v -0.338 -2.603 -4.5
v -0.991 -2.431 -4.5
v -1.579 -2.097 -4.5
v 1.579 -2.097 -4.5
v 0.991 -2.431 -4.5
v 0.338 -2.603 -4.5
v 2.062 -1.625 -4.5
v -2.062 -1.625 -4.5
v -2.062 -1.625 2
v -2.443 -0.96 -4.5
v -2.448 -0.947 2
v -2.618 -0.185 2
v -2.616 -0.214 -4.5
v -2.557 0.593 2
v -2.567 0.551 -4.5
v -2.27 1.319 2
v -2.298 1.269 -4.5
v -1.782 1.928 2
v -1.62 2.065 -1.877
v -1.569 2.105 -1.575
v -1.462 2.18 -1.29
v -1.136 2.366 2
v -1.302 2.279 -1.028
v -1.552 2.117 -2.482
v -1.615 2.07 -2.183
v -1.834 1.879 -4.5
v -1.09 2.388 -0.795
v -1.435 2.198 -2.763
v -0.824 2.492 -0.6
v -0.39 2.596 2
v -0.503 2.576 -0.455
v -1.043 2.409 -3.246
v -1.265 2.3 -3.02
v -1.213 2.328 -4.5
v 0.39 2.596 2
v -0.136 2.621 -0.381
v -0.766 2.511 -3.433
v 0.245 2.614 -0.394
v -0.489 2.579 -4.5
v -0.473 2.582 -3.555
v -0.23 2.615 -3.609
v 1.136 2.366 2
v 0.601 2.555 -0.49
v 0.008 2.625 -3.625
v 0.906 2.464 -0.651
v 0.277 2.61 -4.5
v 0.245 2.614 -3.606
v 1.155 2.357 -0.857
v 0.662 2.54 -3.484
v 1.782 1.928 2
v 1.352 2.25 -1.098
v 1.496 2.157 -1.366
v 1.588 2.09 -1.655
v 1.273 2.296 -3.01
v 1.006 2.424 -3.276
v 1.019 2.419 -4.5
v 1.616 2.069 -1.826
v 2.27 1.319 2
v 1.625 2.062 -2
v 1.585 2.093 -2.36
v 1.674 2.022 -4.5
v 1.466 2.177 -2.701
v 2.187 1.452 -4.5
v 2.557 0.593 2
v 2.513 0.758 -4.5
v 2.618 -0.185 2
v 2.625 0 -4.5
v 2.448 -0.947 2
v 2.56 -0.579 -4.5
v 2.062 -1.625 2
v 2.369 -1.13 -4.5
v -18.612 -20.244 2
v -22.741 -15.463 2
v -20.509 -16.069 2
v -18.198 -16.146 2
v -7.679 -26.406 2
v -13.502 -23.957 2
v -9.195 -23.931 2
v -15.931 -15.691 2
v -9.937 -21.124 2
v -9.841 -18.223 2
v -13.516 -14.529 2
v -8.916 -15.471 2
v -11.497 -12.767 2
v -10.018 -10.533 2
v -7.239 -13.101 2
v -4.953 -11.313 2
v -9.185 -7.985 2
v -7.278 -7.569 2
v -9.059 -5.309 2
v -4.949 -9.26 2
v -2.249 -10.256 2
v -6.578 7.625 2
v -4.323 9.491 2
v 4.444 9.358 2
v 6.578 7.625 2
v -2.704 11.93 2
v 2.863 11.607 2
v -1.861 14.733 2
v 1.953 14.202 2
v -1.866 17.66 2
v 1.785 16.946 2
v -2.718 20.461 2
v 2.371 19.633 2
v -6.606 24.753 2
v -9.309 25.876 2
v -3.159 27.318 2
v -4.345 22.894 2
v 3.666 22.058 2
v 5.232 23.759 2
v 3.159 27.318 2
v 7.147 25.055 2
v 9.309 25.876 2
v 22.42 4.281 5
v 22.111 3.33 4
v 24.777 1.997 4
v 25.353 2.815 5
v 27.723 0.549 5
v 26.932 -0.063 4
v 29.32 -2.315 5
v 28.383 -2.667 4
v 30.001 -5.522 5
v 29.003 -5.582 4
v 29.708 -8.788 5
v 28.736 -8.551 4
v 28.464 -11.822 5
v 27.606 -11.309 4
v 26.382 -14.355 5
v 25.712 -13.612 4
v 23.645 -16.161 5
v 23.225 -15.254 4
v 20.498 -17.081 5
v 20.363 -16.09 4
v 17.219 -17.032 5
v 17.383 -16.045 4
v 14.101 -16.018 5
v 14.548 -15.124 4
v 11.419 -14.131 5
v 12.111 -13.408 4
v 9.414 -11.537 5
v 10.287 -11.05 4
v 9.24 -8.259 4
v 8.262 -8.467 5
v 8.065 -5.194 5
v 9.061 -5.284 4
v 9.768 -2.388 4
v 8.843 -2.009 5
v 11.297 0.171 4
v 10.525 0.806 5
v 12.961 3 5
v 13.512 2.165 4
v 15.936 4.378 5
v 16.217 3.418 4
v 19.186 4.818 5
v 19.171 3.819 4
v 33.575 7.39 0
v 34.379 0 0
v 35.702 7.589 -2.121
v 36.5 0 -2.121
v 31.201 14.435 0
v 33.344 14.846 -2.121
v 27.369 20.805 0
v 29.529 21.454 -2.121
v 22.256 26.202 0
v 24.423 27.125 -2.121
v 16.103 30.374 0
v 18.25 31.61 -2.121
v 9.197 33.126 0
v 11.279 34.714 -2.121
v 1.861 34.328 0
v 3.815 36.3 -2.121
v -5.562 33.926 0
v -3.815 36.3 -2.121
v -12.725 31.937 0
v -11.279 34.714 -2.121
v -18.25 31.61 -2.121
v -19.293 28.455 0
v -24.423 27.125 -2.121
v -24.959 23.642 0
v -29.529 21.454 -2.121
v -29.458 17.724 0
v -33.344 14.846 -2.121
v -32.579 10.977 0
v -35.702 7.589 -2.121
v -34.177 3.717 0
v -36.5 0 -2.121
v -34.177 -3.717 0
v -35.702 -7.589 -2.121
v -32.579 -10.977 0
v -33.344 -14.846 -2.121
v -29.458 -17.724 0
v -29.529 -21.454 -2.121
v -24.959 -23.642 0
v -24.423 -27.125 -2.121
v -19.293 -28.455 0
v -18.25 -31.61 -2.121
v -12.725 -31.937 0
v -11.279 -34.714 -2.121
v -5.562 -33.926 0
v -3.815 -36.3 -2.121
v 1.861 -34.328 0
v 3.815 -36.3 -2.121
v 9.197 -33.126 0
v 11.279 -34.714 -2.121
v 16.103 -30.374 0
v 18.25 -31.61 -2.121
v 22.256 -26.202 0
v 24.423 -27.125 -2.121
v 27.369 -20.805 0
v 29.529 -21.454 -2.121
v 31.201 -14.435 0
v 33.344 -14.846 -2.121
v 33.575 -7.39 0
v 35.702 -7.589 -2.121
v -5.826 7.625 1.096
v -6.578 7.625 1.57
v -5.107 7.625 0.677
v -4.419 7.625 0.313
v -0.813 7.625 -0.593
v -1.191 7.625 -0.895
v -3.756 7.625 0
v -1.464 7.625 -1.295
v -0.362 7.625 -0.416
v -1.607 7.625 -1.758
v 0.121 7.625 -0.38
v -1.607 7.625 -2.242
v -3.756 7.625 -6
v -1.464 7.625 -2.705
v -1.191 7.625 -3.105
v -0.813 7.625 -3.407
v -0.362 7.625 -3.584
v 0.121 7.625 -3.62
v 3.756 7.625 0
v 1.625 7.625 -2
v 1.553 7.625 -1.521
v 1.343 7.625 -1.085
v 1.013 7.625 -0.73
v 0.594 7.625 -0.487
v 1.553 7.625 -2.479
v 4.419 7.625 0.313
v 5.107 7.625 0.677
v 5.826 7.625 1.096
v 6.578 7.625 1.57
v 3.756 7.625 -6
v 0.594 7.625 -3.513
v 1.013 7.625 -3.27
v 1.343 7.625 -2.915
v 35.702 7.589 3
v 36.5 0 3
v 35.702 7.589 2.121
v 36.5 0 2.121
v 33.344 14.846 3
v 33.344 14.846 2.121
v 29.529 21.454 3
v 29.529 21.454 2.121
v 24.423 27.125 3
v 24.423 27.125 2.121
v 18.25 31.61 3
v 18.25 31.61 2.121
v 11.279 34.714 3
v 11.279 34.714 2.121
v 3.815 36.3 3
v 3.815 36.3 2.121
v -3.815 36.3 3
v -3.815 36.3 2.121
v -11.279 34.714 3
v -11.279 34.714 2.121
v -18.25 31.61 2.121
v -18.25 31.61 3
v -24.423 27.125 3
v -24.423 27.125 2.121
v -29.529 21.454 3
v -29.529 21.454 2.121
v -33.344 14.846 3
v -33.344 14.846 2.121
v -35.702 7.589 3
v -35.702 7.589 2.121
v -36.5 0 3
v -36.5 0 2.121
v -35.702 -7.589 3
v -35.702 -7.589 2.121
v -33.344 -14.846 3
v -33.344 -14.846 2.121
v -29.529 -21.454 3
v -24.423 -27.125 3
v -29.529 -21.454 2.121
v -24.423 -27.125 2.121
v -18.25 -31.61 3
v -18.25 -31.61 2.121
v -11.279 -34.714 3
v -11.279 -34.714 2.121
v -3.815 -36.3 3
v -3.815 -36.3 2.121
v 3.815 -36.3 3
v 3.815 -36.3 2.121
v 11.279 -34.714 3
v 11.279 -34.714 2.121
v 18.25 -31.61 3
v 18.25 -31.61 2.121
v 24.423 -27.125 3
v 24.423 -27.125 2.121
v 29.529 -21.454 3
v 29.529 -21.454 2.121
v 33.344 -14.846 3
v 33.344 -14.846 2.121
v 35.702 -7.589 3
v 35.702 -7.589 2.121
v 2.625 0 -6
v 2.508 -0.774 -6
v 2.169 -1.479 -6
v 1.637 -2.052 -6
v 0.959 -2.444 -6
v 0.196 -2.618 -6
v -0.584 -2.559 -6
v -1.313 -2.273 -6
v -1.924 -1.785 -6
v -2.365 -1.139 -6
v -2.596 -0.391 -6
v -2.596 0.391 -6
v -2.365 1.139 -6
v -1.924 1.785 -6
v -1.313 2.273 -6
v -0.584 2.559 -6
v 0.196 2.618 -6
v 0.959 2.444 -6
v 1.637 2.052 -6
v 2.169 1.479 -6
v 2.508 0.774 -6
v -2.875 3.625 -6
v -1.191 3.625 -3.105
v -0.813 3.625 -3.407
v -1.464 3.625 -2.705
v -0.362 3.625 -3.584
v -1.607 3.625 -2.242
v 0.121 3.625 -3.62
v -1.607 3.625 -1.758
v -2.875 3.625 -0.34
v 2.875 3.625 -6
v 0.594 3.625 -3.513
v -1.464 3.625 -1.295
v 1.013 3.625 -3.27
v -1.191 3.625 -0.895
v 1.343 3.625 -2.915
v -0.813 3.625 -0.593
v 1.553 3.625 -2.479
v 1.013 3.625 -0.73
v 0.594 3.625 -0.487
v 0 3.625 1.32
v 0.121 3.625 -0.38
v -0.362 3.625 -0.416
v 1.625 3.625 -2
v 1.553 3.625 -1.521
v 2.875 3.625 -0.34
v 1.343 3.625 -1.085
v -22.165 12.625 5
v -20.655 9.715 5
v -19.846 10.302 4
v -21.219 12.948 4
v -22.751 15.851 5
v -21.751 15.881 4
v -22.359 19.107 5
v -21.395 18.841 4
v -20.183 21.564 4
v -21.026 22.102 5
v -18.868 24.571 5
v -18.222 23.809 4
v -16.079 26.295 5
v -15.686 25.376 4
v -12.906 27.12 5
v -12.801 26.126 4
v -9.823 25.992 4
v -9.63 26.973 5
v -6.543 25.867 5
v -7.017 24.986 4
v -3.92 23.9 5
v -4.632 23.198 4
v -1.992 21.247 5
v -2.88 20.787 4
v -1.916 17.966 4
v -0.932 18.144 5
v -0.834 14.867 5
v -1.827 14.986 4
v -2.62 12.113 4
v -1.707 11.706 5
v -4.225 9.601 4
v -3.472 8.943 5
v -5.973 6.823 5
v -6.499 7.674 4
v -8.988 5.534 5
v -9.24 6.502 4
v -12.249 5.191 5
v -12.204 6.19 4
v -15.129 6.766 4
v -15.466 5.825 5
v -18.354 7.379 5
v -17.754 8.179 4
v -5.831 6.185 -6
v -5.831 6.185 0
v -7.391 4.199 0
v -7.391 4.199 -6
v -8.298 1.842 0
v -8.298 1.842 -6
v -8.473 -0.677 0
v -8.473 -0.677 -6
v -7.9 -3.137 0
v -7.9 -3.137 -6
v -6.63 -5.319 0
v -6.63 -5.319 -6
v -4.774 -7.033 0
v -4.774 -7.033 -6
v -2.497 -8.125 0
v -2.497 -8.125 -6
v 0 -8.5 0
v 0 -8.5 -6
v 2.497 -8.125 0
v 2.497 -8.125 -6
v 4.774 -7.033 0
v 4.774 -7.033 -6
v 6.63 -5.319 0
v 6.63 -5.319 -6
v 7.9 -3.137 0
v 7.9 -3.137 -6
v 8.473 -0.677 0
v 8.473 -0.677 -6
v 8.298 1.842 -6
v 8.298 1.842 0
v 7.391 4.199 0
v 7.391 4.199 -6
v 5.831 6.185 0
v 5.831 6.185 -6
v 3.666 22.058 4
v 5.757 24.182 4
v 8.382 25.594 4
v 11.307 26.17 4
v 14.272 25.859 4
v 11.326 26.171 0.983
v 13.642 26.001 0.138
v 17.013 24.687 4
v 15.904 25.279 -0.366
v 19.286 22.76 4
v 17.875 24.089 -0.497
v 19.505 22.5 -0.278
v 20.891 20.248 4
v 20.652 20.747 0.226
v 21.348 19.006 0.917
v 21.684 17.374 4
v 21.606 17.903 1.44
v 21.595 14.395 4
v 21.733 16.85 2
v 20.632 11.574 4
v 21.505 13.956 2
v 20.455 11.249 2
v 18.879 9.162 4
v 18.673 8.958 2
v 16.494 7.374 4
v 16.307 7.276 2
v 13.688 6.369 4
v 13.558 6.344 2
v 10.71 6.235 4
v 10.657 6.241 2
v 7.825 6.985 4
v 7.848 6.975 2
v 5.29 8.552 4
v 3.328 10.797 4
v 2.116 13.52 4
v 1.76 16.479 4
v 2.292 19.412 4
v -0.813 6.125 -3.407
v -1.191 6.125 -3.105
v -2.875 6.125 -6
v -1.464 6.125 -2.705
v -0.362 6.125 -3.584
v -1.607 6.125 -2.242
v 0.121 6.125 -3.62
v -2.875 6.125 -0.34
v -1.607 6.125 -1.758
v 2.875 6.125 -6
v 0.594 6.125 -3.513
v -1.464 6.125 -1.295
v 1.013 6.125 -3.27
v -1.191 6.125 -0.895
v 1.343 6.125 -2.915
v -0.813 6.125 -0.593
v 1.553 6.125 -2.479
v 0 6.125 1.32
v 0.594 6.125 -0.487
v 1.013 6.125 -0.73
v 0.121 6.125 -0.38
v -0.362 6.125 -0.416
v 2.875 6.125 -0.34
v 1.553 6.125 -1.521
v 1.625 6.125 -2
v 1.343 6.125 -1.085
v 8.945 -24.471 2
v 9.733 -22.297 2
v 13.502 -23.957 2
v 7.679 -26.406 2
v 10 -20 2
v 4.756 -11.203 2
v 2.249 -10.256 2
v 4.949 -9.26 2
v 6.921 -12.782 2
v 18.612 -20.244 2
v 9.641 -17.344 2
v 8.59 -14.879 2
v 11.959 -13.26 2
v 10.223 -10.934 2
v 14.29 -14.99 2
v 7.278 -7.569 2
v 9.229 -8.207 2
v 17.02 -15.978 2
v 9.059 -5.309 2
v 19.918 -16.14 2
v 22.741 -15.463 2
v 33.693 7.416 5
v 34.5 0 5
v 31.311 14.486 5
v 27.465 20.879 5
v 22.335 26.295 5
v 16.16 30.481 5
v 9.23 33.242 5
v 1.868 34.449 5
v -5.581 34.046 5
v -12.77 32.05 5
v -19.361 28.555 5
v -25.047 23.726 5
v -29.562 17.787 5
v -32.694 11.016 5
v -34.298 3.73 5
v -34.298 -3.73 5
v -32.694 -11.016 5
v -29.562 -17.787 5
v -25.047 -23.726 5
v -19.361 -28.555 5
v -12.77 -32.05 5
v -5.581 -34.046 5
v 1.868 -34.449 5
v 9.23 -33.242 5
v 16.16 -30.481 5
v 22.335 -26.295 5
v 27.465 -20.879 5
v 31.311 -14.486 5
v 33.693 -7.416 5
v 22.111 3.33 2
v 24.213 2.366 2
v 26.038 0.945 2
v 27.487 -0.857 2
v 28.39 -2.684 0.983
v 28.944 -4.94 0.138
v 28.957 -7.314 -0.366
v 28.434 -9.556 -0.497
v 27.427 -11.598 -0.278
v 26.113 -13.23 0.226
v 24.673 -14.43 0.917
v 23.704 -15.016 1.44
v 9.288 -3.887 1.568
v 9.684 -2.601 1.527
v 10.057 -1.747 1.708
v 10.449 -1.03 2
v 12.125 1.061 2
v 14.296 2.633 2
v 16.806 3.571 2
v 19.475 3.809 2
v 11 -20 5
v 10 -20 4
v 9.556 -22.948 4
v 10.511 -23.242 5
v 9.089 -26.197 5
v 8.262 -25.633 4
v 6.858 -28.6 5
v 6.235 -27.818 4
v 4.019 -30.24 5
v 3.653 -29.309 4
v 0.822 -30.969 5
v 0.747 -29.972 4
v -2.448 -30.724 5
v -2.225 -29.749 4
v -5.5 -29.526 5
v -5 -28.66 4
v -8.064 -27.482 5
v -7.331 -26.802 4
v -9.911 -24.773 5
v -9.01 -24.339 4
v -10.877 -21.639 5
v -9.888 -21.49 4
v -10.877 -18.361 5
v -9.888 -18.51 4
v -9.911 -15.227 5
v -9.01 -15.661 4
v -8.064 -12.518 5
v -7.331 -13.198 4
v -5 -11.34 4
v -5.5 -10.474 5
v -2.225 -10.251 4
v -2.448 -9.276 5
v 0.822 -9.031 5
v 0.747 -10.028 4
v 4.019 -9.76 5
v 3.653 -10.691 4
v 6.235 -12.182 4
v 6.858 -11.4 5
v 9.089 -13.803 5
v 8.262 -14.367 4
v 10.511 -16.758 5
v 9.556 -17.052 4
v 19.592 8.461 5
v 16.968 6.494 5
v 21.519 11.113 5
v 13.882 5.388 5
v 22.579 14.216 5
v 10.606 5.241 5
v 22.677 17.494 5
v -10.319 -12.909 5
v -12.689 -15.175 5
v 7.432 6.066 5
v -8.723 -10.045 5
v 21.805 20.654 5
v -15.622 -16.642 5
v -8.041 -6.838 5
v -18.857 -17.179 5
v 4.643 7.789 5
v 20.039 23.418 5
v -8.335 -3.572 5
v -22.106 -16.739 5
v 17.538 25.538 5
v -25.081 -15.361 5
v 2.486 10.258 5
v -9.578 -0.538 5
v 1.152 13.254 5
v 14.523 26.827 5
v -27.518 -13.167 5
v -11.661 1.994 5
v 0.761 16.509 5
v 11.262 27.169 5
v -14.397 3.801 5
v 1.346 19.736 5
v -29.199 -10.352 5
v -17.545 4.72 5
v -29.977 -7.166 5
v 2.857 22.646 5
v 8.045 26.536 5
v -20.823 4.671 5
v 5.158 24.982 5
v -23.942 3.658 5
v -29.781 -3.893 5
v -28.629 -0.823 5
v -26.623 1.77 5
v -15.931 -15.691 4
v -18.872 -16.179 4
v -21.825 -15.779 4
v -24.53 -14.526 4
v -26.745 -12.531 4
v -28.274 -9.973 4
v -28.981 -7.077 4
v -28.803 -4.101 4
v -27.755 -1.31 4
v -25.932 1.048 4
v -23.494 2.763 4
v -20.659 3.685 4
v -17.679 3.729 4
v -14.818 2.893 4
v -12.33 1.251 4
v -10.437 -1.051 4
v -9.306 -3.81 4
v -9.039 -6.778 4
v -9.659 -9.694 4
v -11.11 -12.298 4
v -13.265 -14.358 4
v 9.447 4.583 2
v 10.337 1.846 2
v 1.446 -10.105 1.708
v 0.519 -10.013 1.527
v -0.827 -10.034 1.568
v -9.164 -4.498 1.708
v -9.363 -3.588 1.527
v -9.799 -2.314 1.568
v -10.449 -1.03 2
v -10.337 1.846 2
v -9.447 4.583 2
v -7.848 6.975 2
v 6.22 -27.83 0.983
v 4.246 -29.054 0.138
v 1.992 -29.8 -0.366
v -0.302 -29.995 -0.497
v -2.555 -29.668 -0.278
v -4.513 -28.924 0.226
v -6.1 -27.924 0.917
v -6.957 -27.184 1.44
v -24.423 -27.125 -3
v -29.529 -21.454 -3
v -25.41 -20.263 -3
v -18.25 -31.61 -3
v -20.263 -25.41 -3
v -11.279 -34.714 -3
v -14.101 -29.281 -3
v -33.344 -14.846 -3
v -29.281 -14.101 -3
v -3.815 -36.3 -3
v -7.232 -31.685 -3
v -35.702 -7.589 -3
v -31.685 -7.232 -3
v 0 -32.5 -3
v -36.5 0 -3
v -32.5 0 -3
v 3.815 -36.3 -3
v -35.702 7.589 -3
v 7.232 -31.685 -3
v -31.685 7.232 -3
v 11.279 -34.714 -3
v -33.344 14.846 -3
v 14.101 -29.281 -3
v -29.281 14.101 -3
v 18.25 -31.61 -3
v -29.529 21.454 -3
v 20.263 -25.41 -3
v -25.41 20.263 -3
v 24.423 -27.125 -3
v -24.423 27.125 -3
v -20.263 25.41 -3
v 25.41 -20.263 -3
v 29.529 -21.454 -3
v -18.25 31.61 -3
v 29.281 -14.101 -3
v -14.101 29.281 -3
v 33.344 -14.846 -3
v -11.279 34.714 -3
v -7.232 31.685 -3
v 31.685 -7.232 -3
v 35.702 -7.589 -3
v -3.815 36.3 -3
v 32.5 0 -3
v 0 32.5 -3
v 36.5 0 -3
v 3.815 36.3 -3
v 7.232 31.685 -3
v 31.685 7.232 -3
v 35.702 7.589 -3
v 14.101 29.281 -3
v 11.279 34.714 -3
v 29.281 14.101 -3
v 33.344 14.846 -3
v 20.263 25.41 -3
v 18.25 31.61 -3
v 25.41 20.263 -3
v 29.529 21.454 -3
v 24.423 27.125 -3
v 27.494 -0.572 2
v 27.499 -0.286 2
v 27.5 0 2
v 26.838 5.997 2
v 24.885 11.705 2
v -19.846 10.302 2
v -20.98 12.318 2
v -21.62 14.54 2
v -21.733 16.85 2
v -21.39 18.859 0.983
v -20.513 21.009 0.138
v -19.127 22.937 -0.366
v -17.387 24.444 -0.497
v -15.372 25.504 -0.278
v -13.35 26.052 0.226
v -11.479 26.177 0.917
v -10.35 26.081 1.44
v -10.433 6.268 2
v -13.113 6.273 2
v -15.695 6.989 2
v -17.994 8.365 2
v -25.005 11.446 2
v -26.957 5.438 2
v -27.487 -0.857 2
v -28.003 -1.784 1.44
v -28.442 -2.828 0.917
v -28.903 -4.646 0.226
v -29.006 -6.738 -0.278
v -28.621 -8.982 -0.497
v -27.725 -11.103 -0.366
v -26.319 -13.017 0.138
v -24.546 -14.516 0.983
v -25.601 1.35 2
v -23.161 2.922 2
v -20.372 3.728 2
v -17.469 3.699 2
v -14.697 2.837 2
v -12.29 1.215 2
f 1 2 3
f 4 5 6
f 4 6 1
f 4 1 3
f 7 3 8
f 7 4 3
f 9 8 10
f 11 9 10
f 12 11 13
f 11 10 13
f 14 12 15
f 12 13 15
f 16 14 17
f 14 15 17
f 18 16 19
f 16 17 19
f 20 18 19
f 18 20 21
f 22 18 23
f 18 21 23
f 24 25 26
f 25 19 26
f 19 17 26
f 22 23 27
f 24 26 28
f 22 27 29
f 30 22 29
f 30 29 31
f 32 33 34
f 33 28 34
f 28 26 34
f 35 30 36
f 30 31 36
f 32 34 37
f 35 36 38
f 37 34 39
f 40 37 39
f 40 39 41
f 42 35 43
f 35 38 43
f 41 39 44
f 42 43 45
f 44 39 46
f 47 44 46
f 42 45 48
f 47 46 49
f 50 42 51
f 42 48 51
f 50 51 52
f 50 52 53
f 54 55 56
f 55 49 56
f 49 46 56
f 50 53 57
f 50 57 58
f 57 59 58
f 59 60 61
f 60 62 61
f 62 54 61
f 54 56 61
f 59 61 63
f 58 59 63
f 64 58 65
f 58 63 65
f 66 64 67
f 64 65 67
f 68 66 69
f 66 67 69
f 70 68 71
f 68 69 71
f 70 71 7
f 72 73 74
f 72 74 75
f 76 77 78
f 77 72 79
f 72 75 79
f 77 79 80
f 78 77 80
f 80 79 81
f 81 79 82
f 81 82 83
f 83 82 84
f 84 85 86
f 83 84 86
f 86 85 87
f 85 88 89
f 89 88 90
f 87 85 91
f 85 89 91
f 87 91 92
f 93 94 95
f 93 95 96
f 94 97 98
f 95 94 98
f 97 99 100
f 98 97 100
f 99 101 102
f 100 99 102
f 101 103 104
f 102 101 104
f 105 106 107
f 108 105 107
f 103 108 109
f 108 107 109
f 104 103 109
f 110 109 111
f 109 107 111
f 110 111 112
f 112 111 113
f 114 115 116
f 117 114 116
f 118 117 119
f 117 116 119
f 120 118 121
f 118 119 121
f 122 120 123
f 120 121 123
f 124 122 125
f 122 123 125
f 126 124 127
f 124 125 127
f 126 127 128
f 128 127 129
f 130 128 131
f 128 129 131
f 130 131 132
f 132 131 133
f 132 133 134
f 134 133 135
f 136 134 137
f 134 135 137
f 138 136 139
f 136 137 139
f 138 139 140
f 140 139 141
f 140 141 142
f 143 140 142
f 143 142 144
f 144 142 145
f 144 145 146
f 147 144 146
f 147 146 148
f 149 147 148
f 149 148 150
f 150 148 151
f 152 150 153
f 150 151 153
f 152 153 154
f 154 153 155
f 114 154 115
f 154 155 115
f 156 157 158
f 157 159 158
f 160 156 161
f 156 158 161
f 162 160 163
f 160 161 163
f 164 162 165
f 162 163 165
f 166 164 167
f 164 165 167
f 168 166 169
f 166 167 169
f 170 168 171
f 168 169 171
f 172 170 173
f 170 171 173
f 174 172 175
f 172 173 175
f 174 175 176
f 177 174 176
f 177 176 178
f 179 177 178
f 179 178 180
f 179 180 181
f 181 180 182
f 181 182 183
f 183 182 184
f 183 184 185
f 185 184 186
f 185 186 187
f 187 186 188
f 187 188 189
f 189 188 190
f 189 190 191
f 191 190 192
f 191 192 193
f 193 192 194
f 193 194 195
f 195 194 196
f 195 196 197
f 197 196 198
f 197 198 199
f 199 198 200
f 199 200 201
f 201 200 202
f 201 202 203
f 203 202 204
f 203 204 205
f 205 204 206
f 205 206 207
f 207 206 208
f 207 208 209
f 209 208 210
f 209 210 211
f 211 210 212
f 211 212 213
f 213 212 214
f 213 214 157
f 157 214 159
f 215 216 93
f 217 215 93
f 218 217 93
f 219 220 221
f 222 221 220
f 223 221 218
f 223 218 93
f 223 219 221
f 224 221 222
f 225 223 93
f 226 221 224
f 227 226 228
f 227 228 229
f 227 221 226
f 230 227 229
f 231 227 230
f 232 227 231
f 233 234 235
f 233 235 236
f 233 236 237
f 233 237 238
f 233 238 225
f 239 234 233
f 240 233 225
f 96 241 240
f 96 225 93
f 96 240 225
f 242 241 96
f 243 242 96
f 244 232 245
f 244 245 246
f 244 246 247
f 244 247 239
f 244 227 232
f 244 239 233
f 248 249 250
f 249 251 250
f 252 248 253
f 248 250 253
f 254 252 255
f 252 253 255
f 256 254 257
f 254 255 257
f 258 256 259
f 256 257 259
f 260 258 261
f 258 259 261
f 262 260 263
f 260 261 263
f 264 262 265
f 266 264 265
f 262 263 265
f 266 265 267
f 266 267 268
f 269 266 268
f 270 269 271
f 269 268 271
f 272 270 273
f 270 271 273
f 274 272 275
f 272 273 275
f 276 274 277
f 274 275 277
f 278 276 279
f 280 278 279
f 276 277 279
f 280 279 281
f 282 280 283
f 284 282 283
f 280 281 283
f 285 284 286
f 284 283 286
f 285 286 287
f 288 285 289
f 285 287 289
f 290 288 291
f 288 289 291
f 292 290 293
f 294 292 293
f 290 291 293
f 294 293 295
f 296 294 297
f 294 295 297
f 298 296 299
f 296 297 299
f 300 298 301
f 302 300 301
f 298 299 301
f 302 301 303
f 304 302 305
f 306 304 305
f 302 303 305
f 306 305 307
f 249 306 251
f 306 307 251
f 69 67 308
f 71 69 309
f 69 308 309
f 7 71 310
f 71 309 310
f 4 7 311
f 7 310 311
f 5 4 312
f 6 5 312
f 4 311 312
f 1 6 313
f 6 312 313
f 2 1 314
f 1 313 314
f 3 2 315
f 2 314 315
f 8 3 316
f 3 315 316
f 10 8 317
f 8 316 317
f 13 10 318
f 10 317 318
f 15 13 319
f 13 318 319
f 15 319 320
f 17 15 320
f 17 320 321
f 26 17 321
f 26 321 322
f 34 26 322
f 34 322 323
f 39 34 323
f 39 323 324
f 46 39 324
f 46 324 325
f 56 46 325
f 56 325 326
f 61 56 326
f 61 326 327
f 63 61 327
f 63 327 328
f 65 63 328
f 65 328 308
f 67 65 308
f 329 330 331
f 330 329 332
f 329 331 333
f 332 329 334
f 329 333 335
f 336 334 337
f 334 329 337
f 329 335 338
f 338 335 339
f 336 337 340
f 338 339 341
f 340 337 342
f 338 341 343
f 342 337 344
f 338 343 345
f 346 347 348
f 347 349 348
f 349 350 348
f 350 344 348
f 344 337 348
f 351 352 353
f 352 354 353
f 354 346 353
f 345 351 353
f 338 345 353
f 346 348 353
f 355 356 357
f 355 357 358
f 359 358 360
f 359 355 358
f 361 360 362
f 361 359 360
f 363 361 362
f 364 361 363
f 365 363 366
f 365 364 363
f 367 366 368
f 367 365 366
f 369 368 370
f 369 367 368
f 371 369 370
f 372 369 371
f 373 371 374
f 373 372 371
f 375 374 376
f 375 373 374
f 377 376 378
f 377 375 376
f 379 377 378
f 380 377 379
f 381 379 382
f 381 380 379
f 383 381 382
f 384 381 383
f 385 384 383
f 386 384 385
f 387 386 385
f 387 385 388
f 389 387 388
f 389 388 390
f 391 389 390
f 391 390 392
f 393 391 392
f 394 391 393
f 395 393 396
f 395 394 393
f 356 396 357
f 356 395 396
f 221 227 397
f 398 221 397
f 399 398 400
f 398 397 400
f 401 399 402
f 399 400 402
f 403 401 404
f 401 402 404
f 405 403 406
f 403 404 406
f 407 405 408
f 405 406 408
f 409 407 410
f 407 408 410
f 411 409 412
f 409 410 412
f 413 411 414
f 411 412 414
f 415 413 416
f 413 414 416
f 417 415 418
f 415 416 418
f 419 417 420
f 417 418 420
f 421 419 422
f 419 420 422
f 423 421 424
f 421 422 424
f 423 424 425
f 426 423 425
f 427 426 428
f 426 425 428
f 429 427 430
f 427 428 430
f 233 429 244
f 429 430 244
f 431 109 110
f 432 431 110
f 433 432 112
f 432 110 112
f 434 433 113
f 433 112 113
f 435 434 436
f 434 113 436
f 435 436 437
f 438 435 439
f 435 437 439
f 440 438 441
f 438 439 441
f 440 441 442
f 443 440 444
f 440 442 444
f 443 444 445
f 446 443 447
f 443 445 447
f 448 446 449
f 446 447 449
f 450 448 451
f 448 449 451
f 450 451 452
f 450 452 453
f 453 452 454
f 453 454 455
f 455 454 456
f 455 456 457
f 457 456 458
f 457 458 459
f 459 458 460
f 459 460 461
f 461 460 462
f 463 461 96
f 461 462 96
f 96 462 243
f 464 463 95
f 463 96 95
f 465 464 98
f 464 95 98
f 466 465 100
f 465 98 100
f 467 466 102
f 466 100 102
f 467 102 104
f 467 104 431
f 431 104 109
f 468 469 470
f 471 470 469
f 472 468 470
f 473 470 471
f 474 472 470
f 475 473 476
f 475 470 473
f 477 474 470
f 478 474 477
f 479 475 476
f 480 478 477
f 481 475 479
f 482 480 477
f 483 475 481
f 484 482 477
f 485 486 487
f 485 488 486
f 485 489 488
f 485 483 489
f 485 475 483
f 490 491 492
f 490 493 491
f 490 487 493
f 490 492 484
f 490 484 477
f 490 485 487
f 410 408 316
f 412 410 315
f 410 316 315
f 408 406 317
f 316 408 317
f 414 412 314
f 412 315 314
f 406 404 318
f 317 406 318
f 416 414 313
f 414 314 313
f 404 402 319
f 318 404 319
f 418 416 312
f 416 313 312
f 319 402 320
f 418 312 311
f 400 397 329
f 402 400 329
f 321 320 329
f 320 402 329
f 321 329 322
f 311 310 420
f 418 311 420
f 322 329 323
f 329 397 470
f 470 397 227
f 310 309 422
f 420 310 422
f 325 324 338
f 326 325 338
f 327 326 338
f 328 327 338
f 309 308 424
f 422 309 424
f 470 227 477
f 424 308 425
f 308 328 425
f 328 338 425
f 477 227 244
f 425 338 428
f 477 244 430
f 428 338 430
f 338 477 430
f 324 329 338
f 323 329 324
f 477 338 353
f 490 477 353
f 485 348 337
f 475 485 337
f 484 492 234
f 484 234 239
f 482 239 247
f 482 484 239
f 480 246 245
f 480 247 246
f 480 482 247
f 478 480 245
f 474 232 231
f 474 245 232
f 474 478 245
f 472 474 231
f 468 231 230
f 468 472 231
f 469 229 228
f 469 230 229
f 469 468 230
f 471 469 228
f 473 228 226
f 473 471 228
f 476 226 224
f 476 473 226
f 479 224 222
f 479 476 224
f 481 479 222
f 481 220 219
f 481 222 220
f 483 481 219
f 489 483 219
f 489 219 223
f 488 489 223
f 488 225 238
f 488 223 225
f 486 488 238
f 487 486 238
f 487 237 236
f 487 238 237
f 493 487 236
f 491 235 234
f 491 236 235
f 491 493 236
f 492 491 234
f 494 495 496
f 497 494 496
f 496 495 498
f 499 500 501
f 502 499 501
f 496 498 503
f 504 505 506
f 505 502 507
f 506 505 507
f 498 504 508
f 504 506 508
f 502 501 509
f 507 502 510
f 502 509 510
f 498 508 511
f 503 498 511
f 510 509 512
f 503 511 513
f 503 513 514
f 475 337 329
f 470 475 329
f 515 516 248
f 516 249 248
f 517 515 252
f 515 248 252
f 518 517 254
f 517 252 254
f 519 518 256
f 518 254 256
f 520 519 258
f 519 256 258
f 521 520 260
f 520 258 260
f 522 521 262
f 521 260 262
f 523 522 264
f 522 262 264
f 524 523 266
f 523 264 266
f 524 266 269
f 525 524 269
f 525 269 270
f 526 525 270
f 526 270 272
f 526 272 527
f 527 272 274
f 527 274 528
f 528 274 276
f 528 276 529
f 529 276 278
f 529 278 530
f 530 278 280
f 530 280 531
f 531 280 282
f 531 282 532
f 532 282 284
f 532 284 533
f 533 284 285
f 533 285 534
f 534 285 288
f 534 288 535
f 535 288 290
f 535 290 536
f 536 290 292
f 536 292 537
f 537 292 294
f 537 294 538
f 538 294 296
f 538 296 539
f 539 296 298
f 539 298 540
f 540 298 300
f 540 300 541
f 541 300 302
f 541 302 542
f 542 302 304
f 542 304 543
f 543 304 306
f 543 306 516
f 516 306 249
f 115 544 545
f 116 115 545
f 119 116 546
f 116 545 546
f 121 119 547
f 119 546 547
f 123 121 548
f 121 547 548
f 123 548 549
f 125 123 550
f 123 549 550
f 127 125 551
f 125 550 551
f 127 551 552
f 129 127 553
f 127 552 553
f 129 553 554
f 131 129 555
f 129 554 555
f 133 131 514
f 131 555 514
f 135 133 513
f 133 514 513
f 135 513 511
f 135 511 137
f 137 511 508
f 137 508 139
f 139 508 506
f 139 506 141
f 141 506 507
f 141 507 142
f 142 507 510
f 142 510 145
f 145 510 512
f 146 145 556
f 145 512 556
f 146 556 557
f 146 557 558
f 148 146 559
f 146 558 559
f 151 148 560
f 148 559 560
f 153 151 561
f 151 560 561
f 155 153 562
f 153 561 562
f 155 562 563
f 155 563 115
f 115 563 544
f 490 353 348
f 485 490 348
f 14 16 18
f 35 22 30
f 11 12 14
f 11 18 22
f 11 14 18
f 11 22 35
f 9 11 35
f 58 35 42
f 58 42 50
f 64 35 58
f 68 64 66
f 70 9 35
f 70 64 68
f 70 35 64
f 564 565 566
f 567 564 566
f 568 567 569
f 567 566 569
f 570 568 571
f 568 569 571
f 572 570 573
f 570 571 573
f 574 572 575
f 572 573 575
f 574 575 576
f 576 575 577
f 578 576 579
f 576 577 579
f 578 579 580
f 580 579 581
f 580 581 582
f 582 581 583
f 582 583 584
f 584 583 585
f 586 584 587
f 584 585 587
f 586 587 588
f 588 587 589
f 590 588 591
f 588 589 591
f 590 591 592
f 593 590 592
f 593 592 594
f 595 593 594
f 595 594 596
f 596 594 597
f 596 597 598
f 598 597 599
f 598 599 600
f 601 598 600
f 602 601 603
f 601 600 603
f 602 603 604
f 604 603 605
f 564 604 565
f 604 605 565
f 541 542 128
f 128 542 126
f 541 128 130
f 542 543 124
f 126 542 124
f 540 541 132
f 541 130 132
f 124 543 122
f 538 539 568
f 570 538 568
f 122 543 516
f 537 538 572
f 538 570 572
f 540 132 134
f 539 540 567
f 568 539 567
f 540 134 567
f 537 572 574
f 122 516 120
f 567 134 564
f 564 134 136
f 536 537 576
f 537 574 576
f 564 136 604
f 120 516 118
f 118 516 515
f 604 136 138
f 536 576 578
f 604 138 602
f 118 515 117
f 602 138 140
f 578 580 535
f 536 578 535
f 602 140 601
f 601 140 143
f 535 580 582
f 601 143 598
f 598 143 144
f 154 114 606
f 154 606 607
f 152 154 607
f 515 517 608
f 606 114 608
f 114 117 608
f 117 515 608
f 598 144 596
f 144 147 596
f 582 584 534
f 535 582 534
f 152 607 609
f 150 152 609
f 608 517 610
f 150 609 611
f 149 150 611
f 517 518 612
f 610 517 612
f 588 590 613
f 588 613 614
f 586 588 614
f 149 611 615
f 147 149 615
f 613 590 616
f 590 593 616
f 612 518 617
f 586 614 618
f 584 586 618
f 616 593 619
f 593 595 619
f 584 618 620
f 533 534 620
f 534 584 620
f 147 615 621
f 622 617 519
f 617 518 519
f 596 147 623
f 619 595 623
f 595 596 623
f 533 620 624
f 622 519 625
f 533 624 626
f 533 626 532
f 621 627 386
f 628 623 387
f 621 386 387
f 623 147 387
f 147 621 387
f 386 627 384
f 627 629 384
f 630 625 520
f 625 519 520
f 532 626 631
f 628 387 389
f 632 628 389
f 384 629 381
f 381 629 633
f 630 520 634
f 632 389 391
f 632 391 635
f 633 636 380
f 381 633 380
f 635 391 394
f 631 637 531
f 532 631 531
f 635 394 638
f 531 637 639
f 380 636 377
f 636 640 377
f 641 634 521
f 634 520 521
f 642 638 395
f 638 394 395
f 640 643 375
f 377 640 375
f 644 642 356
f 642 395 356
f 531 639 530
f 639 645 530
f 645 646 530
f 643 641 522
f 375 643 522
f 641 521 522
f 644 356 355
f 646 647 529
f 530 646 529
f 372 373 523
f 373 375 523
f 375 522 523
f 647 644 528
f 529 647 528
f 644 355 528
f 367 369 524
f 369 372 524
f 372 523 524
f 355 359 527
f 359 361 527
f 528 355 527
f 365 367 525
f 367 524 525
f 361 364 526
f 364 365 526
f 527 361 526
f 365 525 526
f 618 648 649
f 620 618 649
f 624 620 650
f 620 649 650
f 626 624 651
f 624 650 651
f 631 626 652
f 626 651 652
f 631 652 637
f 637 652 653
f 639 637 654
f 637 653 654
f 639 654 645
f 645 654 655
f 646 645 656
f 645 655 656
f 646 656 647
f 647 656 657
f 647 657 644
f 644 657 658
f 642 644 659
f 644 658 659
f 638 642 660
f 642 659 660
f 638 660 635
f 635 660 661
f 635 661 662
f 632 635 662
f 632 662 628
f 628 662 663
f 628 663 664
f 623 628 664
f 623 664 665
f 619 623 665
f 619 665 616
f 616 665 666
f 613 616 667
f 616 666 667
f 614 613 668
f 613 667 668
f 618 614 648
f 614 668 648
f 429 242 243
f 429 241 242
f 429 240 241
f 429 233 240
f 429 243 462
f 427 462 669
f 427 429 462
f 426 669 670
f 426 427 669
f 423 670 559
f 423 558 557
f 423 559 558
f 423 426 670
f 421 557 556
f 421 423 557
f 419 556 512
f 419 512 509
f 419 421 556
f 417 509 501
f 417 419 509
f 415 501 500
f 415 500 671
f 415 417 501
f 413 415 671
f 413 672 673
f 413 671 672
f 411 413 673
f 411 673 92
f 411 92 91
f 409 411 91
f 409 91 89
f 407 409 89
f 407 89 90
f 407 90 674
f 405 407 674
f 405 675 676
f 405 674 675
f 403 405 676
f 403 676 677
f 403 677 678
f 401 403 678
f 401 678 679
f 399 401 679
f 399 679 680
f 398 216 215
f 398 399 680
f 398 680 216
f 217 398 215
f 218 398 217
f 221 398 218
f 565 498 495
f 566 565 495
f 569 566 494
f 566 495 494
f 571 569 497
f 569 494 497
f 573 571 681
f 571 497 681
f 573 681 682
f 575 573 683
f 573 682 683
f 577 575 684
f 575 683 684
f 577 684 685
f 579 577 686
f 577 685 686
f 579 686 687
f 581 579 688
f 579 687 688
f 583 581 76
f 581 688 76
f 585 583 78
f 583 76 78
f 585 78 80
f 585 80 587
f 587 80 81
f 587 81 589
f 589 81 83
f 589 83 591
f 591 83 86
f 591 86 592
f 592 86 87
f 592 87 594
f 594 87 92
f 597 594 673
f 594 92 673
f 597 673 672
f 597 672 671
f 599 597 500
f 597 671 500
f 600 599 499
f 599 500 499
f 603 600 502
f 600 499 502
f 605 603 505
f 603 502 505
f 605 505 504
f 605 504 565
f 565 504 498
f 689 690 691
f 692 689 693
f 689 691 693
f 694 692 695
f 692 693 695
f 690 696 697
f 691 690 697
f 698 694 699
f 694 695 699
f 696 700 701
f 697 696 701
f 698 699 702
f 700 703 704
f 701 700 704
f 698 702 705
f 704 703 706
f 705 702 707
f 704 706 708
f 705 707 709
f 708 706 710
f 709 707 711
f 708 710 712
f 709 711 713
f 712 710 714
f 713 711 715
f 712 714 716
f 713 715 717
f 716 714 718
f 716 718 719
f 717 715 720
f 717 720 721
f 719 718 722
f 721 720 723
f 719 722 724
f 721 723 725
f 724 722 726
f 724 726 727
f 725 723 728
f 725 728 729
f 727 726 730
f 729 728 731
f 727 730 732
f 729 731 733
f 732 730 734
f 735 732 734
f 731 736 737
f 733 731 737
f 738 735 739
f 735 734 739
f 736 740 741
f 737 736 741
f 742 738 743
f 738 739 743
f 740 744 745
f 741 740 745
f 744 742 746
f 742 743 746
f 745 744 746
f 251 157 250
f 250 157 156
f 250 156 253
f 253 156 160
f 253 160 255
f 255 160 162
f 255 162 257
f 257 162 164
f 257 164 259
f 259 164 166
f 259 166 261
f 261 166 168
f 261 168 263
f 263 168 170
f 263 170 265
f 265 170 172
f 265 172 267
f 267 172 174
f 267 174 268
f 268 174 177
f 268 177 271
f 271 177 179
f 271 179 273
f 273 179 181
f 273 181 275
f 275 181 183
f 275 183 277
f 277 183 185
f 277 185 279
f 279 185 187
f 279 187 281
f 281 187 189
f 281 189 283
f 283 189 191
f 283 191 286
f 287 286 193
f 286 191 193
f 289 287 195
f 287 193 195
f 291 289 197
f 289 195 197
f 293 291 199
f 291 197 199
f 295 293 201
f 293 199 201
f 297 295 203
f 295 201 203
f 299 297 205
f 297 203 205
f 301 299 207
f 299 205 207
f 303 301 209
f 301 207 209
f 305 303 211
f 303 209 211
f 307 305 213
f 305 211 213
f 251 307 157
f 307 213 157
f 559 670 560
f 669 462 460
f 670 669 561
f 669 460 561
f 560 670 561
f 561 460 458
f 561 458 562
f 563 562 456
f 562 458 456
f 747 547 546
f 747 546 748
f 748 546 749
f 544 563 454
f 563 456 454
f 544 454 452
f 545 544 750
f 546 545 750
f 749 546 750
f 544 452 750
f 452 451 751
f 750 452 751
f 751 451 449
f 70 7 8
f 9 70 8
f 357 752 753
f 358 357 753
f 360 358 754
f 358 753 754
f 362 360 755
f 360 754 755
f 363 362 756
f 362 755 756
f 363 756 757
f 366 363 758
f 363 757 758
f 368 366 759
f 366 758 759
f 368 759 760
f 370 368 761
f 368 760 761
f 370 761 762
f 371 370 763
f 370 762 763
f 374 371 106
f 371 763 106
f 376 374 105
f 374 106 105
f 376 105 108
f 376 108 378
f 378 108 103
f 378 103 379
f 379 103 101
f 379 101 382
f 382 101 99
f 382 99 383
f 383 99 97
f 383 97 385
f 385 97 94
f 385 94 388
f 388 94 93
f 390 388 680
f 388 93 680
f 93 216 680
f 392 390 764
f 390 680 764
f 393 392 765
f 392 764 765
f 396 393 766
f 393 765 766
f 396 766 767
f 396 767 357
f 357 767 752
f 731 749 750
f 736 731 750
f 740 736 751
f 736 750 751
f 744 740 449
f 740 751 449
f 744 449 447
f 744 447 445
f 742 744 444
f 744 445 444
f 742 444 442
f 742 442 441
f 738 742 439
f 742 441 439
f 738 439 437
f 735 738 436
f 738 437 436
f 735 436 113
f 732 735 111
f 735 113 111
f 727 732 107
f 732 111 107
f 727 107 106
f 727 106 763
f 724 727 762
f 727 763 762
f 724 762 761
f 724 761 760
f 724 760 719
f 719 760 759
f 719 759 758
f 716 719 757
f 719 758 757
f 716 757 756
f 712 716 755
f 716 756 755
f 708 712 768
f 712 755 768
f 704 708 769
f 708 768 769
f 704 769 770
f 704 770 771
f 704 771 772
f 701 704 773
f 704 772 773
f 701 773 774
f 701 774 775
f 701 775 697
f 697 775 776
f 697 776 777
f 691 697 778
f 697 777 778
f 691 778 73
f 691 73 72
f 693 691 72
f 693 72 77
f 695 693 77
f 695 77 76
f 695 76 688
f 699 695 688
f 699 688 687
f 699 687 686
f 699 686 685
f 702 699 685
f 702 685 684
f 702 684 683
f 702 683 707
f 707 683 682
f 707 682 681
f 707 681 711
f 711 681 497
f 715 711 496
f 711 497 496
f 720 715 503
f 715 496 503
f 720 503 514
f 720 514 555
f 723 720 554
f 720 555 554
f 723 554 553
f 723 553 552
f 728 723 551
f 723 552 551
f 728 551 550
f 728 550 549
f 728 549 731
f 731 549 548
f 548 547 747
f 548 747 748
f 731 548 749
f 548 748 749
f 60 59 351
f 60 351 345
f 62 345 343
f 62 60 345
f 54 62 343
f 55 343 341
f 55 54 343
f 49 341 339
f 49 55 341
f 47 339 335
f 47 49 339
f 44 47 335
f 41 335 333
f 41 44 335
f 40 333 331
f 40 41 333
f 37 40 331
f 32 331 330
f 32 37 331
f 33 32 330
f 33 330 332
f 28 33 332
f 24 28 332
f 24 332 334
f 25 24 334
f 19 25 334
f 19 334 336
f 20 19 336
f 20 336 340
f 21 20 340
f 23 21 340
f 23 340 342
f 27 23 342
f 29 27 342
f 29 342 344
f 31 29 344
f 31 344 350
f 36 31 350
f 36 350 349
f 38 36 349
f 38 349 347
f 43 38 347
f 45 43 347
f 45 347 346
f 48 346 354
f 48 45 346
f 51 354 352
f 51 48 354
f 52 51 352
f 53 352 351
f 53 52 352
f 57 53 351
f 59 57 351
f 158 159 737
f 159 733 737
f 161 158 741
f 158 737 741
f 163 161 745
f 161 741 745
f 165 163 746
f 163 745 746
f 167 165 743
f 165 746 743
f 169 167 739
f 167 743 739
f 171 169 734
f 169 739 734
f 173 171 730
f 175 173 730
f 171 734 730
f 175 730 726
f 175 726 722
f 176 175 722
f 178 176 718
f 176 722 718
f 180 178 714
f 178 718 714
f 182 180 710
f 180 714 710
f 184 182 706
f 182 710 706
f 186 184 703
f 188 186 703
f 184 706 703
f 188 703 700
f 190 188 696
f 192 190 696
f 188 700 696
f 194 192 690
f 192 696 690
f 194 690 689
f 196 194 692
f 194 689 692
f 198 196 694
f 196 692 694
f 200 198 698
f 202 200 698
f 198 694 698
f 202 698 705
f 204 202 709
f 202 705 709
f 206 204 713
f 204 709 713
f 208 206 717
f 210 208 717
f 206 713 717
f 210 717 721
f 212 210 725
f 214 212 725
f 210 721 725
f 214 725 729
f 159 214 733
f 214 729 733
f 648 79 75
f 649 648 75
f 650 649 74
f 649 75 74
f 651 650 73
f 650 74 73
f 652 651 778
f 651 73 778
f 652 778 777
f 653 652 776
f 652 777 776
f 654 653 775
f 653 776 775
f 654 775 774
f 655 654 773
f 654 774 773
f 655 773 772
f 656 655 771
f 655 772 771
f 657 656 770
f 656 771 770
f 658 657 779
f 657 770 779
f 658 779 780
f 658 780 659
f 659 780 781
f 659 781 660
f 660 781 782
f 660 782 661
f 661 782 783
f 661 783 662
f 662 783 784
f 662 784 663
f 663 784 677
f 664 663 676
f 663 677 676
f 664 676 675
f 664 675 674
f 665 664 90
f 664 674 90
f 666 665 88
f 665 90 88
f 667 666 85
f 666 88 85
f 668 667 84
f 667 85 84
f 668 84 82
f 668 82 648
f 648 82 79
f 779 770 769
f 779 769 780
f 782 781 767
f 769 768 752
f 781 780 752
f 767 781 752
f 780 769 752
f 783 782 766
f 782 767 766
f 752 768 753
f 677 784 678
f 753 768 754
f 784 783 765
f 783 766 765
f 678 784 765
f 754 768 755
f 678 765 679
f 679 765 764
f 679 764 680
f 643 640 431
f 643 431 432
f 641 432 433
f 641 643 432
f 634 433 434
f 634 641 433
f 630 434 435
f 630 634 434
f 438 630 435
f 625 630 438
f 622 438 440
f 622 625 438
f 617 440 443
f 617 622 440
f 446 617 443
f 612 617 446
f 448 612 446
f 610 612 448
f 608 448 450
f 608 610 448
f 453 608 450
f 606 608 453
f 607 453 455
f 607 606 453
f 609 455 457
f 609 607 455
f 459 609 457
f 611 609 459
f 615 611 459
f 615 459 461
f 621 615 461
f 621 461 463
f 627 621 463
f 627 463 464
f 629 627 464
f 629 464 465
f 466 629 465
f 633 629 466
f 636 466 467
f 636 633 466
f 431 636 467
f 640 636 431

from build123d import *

# Parameters (mm, degrees)
CYLINDER001_R          = 1.625
CYLINDER001_DEPTH      = 10
CYLINDER001_ROLL_ANGLE = -90
PAD_DEPTH              = 1.25
CYLINDER_R             = 8.5
CYLINDER_DEPTH         = 10
SKETCH001_R            = 2.625
POCKET_DEPTH           = 1.5
POCKET001_DEPTH        = 6.5
SKETCH004_W            = 18
SKETCH004_H            = 2
POCKET002_DEPTH        = 10.001
CHAMFER_SIZE           = 2
SKETCH005_R            = 10
POCKET003_DEPTH        = 3
POLARPATTERN_COUNT     = 5
CHAMFER001_SIZE        = 1


with BuildPart() as wheelrevolution:
    # Sketch → Revolution (revolve)
    with BuildSketch(Plane.XZ):
        Polygon((34.5, 5), (36.5, 3), (36.5, 2.12132), (34.37868, 0), (36.5, -2.12132), (36.5, -3), (32.5, -3), (27.5, 2), (0, 2), (0, 5), align=None)
    revolve(axis=Axis((0, 0, 0), (0, 0, 1)))


with BuildPart() as wheelshaftscrewcylinder001:
    # Cylinder001 → Cylinder001 (new body)
    with BuildSketch(Plane.XY):
        Circle(CYLINDER001_R)
    extrude(amount=CYLINDER001_DEPTH)


with BuildPart() as wheelshaftscrewcylinder001_1:
    # Cylinder001 roll: moved
    add(wheelshaftscrewcylinder001.part.rotate(Axis((0, 0, 0), (1, 0, 0)), CYLINDER001_ROLL_ANGLE))


with BuildPart() as wheelshaftscrewcylinder001_2:
    # Cylinder001 placement: moved
    add(wheelshaftscrewcylinder001_1.part.moved(Location((0, 0, -2))))


with BuildPart() as wheelshaftnutscrewfusion:
    # Sketch003 → Pad (new body, symmetric)
    with BuildSketch(Plane.XZ):
        Polygon((2.875, -5), (2.875, 1.659882), (0, 3.319764), (-2.875, 1.659882), (-2.875, -5), align=None)
    extrude(amount=PAD_DEPTH, both=True)


with BuildPart() as wheelshaftnutscrewfusion_1:
    # Clone placement: moved
    add(wheelshaftnutscrewfusion.part.moved(Location((0, 4.875, -2))))

    # Fusion: union WheelShaftScrewCylinder001
    add(wheelshaftscrewcylinder001_2.part)


with BuildPart() as wheelcutoutchamfer001_final:
    # Cylinder → Cylinder (new body)
    with BuildSketch(Plane.XY.offset(-6)):
        Circle(CYLINDER_R)
    extrude(amount=CYLINDER_DEPTH)

    # Sketch001 → Pocket (cut)
    with BuildSketch(Plane(origin=(0, 0, -6), x_dir=(1, 0, 0), z_dir=(0, 0, -1))):
        Circle(SKETCH001_R)
    extrude(amount=-POCKET_DEPTH, mode=Mode.SUBTRACT)

    # Sketch002 → Pocket001 (cut)
    with BuildSketch(Plane(origin=(0, 0, -4.5), x_dir=(1, 0, 0), z_dir=(0, 0, -1))):
        with BuildLine():
            ThreePointArc((-2.061553, 1.625), (0, -2.625), (2.061553, 1.625))
            Line((2.061553, 1.625), (-2.061553, 1.625))
        make_face()
    extrude(amount=-POCKET001_DEPTH, mode=Mode.SUBTRACT)

    # Cut: cut WheelShaftNutScrewFusion
    add(wheelshaftnutscrewfusion_1.part, mode=Mode.SUBTRACT)

    # Sketch004 → Pocket002 (cut, through all)
    with BuildSketch(Plane(origin=(0, 0, -6), x_dir=(1, 0, 0), z_dir=(0, 0, -1))):
        with Locations((0, -8.625)):
            Rectangle(SKETCH004_W, SKETCH004_H)
    extrude(amount=-POCKET002_DEPTH, mode=Mode.SUBTRACT)

    # Fusion001: union WheelRevolution
    add(wheelrevolution.part)

    # Chamfer
    chamfer_edges = [wheelcutoutchamfer001_final.edges().sort_by_distance(p)[0] for p in [
        (-4.490096, -7.217274, 2),
    ]]
    chamfer(chamfer_edges, length=CHAMFER_SIZE)

    # Sketch005 → Pocket003 (cut, symmetric)
    with BuildSketch(Plane(origin=(0, 0, 2), x_dir=(1, 0, 0), z_dir=(0, 0, -1))):
        with Locations((0, 20)):
            Circle(SKETCH005_R)
    pocket003 = extrude(amount=POCKET003_DEPTH, both=True, mode=Mode.SUBTRACT)

    # PolarPattern: Pocket003 ×5 about axis
    polarpattern_axis = Axis((0, 0, 2), (0, 0, -1))
    for i in range(1, POLARPATTERN_COUNT):
        add(pocket003.rotate(polarpattern_axis, i * 360 / POLARPATTERN_COUNT), mode=Mode.SUBTRACT)

    # Chamfer001
    chamfer001_edges = [wheelcutoutchamfer001_final.edges().sort_by_distance(p)[0] for p in [
        (19.845875, 10.302487, 5),
        (15.93096, -15.690905, 5),
        (-10, -20, 5),
        (-22.1113, 3.330225, 5),
        (-3.665535, 22.058192, 5),
    ]]
    chamfer(chamfer001_edges, length=CHAMFER001_SIZE)


solid = wheelcutoutchamfer001_final.part
